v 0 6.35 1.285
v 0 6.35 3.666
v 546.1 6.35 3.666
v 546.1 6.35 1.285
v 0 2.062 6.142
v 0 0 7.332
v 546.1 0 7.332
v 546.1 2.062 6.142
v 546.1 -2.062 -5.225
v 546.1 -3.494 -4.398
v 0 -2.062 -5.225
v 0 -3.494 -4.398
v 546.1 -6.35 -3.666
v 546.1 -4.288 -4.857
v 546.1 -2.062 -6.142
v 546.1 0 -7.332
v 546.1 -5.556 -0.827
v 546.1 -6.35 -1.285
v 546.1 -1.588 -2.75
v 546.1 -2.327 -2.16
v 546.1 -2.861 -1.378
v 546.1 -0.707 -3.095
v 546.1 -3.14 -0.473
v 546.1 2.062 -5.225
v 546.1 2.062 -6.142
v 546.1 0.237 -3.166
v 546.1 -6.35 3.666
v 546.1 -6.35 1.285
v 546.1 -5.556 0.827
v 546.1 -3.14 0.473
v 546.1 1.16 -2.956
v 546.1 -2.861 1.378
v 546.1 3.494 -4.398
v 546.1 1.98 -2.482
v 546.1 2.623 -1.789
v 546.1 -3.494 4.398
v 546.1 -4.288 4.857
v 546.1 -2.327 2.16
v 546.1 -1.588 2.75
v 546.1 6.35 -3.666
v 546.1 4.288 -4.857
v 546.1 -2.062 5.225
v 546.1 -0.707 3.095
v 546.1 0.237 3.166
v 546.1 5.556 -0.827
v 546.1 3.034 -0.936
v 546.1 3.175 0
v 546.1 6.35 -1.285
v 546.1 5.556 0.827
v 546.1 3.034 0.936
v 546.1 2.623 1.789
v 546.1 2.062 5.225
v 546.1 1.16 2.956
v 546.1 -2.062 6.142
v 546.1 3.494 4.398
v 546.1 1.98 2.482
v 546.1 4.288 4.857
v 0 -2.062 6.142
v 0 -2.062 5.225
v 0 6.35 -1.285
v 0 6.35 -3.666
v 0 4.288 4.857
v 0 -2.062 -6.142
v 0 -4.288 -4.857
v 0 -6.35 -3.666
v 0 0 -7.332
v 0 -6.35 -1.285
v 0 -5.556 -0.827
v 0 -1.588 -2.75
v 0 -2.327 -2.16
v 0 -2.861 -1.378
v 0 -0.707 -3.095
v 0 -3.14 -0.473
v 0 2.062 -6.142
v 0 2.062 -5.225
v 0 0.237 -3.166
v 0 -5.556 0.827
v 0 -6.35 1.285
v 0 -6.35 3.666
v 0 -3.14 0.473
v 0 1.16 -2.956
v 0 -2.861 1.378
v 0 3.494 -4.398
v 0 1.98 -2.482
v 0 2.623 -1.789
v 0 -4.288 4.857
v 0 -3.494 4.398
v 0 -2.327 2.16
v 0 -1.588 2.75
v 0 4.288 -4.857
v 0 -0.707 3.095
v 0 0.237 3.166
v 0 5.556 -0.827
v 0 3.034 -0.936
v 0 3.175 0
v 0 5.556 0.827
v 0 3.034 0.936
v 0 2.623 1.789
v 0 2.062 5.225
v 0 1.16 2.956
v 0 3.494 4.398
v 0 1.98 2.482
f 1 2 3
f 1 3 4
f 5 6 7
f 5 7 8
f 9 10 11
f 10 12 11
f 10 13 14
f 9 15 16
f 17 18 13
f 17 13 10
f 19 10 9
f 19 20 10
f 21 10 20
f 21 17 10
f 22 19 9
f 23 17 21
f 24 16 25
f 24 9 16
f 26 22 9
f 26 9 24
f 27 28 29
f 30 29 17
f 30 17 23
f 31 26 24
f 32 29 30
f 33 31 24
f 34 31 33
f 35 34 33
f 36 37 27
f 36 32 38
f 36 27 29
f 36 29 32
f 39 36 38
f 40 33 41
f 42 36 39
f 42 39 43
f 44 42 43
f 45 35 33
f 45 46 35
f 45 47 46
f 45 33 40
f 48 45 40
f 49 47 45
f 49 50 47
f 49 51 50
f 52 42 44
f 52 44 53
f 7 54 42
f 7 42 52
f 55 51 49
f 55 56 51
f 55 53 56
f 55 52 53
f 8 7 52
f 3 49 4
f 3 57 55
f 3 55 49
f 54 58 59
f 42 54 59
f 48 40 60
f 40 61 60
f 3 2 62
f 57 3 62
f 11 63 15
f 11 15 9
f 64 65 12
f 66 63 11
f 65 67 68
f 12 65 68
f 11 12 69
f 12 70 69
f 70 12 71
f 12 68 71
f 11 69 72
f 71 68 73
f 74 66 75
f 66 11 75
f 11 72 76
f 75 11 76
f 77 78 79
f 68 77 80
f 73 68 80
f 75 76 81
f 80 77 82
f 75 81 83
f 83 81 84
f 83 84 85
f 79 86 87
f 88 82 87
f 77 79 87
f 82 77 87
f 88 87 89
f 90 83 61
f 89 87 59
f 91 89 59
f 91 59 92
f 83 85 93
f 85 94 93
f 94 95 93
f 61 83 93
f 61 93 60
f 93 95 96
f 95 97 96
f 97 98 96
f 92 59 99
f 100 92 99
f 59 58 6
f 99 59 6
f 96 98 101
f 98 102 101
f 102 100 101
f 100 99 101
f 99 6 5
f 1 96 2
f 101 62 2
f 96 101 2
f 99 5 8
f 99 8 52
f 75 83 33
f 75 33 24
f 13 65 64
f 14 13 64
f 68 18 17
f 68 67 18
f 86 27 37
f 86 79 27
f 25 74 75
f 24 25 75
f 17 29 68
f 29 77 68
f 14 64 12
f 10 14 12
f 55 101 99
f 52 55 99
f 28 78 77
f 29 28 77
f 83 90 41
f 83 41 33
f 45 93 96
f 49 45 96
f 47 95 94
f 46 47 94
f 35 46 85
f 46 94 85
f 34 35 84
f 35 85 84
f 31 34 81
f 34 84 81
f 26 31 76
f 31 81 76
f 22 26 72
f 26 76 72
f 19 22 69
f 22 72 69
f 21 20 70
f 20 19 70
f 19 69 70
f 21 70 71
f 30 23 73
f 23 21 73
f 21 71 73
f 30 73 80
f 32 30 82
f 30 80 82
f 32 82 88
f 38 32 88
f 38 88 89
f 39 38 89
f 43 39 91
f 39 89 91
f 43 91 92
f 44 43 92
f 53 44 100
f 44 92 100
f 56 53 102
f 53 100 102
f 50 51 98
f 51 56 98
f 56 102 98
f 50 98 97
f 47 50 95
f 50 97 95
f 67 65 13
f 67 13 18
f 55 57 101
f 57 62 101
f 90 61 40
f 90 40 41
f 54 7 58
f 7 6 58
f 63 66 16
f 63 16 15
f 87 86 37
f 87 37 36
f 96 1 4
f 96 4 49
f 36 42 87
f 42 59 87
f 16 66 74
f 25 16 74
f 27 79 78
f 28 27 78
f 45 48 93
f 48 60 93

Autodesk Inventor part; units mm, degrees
ref_plane "YZ Plane" through (0, 0, 0) normal (1, 0, 0) x (0, 1, 0)
ref_plane "XZ Plane" through (0, 0, 0) normal (0, 1, 0) x (-1, 0, 0)
ref_plane "XY Plane" through (0, 0, 0) normal (0, 0, 1) x (1, 0, 0)
sketch "Sketch1" plane through (0, 0, 0) normal (1, 0, 0) x (0, 1, 0)
  line L0 (6.35, 3.6662) -> (6.35, -3.6662) construction
  line L1 (6.35, -3.6662) -> (0, -7.3323) construction
  line L2 (0, -7.3323) -> (-6.35, -3.6662) construction
  line L3 (-6.35, -3.6662) -> (-6.35, 3.6662) construction
  line L4 (-6.35, 3.6662) -> (0, 7.3323) construction
  line L5 (0, 7.3323) -> (6.35, 3.6662) construction
  line L6 (5.5563, -3.2079) -> (5.5563, 3.2079) construction
  line L7 (5.5563, 3.2079) -> (0, 6.4158) construction
  line L8 (0, 6.4158) -> (-5.5563, 3.2079) construction
  line L9 (-5.5563, 3.2079) -> (-5.5563, -3.2079) construction
  line L10 (-5.5563, -3.2079) -> (0, -6.4158) construction
  line L11 (0, -6.4158) -> (5.5563, -3.2079) construction
  line L12 (6.35, 3.6662) -> (6.35, 1.2849)
  line L13 (6.35, 3.6662) -> (4.2878, 4.8568)
  line L14 (6.35, -3.6662) -> (6.35, -1.2849)
  line L15 (6.35, -3.6662) -> (4.2878, -4.8568)
  line L16 (0, -7.3323) -> (2.0622, -6.1417)
  line L17 (0, -7.3323) -> (-2.0622, -6.1417)
  line L18 (-6.35, -3.6662) -> (-4.2878, -4.8568)
  line L19 (-6.35, -3.6662) -> (-6.35, -1.2849)
  line L20 (-6.35, 3.6662) -> (-6.35, 1.2849)
  line L21 (-6.35, 3.6662) -> (-4.2878, 4.8568)
  line L22 (0, 7.3323) -> (2.0622, 6.1417)
  line L23 (0, 7.3323) -> (-2.0622, 6.1417)
  line L24 (6.35, 1.2849) -> (5.5563, 0.8267)
  line L25 (6.35, 1.2849) -> (7.2665, 1.2849) construction
  line L26 (6.35, -1.2849) -> (5.5563, -0.8267)
  line L27 (6.35, -1.2849) -> (7.2665, -1.2849) construction
  line L28 (5.5563, -0.8267) -> (5.5563, 0.8267)
  line L29 (4.2878, -4.8568) -> (3.494, -4.3985)
  line L30 (4.2878, -4.8568) -> (5.2043, -4.8568) construction
  line L31 (2.0622, -6.1417) -> (2.0622, -5.2252)
  line L32 (2.0622, -6.1417) -> (2.9788, -6.1417) construction
  line L33 (-2.0622, -6.1417) -> (-2.0622, -5.2252)
  line L34 (-2.0622, -6.1417) -> (-1.1457, -6.1417) construction
  line L35 (3.494, -4.3985) -> (2.0622, -5.2252)
  line L36 (-4.2878, -4.8568) -> (-3.494, -4.3985)
  line L37 (-4.2878, -4.8568) -> (-3.3712, -4.8568) construction
  line L38 (-3.494, -4.3985) -> (-2.0622, -5.2252)
  line L39 (-6.35, -1.2849) -> (-5.5563, -0.8267)
  line L40 (-6.35, -1.2849) -> (-5.4335, -1.2849) construction
  line L41 (-6.35, 1.2849) -> (-5.5563, 0.8267)
  line L42 (-6.35, 1.2849) -> (-5.4335, 1.2849) construction
  line L43 (-5.5563, 0.8267) -> (-5.5563, -0.8267)
  line L44 (-4.2878, 4.8568) -> (-3.494, 4.3985)
  line L45 (-4.2878, 4.8568) -> (-3.3712, 4.8568) construction
  line L46 (-2.0622, 6.1417) -> (-2.0622, 5.2252)
  line L47 (-2.0622, 6.1417) -> (-1.1457, 6.1417) construction
  line L48 (-2.0622, 5.2252) -> (-3.494, 4.3985)
  line L49 (2.0622, 6.1417) -> (2.0622, 5.2252)
  line L50 (2.0622, 6.1417) -> (2.9788, 6.1417) construction
  line L51 (4.2878, 4.8568) -> (3.494, 4.3985)
  line L52 (4.2878, 4.8568) -> (5.2043, 4.8568) construction
  line L53 (3.494, 4.3985) -> (2.0622, 5.2252)
  circle A0 centre (0, 0) radius 3.175
  dimension "d0" = 12.7
  dimension "d1" = 12.7
  dimension "d2" = 12.7
  dimension "d3" = 120
  dimension "d4" = 120
  dimension "d5" = 6.35
  dimension "d6" = 6.35
  dimension "d7" = 6.35
  dimension "d11" = 0.7937
  dimension "d12" = 2.3813
  dimension "d13" = 2.3813
  dimension "d14" = 2.3813
  dimension "d15" = 2.3813
  dimension "d16" = 2.3813
  dimension "d17" = 2.3813
  dimension "d18" = 2.3813
  dimension "d19" = 2.3813
  dimension "d20" = 2.3813
  dimension "d21" = 2.3813
  dimension "d22" = 2.3813
  dimension "d23" = 2.3813
  dimension "d24" = 150
  dimension "d25" = 150
  dimension "d26" = 150
  dimension "d27" = 90
  dimension "d28" = 90
  dimension "d29" = 30
  dimension "d30" = 30
  dimension "d31" = 30
  dimension "d32" = 30
  dimension "d33" = 90
  dimension "d34" = 90
  dimension "d35" = 150
  dimension "d36" = 6.35
extrude "Extrusion1" add sketch "Sketch1" along normal blind 546.1
properties part number "churro_long" material "Aluminum 6061"
